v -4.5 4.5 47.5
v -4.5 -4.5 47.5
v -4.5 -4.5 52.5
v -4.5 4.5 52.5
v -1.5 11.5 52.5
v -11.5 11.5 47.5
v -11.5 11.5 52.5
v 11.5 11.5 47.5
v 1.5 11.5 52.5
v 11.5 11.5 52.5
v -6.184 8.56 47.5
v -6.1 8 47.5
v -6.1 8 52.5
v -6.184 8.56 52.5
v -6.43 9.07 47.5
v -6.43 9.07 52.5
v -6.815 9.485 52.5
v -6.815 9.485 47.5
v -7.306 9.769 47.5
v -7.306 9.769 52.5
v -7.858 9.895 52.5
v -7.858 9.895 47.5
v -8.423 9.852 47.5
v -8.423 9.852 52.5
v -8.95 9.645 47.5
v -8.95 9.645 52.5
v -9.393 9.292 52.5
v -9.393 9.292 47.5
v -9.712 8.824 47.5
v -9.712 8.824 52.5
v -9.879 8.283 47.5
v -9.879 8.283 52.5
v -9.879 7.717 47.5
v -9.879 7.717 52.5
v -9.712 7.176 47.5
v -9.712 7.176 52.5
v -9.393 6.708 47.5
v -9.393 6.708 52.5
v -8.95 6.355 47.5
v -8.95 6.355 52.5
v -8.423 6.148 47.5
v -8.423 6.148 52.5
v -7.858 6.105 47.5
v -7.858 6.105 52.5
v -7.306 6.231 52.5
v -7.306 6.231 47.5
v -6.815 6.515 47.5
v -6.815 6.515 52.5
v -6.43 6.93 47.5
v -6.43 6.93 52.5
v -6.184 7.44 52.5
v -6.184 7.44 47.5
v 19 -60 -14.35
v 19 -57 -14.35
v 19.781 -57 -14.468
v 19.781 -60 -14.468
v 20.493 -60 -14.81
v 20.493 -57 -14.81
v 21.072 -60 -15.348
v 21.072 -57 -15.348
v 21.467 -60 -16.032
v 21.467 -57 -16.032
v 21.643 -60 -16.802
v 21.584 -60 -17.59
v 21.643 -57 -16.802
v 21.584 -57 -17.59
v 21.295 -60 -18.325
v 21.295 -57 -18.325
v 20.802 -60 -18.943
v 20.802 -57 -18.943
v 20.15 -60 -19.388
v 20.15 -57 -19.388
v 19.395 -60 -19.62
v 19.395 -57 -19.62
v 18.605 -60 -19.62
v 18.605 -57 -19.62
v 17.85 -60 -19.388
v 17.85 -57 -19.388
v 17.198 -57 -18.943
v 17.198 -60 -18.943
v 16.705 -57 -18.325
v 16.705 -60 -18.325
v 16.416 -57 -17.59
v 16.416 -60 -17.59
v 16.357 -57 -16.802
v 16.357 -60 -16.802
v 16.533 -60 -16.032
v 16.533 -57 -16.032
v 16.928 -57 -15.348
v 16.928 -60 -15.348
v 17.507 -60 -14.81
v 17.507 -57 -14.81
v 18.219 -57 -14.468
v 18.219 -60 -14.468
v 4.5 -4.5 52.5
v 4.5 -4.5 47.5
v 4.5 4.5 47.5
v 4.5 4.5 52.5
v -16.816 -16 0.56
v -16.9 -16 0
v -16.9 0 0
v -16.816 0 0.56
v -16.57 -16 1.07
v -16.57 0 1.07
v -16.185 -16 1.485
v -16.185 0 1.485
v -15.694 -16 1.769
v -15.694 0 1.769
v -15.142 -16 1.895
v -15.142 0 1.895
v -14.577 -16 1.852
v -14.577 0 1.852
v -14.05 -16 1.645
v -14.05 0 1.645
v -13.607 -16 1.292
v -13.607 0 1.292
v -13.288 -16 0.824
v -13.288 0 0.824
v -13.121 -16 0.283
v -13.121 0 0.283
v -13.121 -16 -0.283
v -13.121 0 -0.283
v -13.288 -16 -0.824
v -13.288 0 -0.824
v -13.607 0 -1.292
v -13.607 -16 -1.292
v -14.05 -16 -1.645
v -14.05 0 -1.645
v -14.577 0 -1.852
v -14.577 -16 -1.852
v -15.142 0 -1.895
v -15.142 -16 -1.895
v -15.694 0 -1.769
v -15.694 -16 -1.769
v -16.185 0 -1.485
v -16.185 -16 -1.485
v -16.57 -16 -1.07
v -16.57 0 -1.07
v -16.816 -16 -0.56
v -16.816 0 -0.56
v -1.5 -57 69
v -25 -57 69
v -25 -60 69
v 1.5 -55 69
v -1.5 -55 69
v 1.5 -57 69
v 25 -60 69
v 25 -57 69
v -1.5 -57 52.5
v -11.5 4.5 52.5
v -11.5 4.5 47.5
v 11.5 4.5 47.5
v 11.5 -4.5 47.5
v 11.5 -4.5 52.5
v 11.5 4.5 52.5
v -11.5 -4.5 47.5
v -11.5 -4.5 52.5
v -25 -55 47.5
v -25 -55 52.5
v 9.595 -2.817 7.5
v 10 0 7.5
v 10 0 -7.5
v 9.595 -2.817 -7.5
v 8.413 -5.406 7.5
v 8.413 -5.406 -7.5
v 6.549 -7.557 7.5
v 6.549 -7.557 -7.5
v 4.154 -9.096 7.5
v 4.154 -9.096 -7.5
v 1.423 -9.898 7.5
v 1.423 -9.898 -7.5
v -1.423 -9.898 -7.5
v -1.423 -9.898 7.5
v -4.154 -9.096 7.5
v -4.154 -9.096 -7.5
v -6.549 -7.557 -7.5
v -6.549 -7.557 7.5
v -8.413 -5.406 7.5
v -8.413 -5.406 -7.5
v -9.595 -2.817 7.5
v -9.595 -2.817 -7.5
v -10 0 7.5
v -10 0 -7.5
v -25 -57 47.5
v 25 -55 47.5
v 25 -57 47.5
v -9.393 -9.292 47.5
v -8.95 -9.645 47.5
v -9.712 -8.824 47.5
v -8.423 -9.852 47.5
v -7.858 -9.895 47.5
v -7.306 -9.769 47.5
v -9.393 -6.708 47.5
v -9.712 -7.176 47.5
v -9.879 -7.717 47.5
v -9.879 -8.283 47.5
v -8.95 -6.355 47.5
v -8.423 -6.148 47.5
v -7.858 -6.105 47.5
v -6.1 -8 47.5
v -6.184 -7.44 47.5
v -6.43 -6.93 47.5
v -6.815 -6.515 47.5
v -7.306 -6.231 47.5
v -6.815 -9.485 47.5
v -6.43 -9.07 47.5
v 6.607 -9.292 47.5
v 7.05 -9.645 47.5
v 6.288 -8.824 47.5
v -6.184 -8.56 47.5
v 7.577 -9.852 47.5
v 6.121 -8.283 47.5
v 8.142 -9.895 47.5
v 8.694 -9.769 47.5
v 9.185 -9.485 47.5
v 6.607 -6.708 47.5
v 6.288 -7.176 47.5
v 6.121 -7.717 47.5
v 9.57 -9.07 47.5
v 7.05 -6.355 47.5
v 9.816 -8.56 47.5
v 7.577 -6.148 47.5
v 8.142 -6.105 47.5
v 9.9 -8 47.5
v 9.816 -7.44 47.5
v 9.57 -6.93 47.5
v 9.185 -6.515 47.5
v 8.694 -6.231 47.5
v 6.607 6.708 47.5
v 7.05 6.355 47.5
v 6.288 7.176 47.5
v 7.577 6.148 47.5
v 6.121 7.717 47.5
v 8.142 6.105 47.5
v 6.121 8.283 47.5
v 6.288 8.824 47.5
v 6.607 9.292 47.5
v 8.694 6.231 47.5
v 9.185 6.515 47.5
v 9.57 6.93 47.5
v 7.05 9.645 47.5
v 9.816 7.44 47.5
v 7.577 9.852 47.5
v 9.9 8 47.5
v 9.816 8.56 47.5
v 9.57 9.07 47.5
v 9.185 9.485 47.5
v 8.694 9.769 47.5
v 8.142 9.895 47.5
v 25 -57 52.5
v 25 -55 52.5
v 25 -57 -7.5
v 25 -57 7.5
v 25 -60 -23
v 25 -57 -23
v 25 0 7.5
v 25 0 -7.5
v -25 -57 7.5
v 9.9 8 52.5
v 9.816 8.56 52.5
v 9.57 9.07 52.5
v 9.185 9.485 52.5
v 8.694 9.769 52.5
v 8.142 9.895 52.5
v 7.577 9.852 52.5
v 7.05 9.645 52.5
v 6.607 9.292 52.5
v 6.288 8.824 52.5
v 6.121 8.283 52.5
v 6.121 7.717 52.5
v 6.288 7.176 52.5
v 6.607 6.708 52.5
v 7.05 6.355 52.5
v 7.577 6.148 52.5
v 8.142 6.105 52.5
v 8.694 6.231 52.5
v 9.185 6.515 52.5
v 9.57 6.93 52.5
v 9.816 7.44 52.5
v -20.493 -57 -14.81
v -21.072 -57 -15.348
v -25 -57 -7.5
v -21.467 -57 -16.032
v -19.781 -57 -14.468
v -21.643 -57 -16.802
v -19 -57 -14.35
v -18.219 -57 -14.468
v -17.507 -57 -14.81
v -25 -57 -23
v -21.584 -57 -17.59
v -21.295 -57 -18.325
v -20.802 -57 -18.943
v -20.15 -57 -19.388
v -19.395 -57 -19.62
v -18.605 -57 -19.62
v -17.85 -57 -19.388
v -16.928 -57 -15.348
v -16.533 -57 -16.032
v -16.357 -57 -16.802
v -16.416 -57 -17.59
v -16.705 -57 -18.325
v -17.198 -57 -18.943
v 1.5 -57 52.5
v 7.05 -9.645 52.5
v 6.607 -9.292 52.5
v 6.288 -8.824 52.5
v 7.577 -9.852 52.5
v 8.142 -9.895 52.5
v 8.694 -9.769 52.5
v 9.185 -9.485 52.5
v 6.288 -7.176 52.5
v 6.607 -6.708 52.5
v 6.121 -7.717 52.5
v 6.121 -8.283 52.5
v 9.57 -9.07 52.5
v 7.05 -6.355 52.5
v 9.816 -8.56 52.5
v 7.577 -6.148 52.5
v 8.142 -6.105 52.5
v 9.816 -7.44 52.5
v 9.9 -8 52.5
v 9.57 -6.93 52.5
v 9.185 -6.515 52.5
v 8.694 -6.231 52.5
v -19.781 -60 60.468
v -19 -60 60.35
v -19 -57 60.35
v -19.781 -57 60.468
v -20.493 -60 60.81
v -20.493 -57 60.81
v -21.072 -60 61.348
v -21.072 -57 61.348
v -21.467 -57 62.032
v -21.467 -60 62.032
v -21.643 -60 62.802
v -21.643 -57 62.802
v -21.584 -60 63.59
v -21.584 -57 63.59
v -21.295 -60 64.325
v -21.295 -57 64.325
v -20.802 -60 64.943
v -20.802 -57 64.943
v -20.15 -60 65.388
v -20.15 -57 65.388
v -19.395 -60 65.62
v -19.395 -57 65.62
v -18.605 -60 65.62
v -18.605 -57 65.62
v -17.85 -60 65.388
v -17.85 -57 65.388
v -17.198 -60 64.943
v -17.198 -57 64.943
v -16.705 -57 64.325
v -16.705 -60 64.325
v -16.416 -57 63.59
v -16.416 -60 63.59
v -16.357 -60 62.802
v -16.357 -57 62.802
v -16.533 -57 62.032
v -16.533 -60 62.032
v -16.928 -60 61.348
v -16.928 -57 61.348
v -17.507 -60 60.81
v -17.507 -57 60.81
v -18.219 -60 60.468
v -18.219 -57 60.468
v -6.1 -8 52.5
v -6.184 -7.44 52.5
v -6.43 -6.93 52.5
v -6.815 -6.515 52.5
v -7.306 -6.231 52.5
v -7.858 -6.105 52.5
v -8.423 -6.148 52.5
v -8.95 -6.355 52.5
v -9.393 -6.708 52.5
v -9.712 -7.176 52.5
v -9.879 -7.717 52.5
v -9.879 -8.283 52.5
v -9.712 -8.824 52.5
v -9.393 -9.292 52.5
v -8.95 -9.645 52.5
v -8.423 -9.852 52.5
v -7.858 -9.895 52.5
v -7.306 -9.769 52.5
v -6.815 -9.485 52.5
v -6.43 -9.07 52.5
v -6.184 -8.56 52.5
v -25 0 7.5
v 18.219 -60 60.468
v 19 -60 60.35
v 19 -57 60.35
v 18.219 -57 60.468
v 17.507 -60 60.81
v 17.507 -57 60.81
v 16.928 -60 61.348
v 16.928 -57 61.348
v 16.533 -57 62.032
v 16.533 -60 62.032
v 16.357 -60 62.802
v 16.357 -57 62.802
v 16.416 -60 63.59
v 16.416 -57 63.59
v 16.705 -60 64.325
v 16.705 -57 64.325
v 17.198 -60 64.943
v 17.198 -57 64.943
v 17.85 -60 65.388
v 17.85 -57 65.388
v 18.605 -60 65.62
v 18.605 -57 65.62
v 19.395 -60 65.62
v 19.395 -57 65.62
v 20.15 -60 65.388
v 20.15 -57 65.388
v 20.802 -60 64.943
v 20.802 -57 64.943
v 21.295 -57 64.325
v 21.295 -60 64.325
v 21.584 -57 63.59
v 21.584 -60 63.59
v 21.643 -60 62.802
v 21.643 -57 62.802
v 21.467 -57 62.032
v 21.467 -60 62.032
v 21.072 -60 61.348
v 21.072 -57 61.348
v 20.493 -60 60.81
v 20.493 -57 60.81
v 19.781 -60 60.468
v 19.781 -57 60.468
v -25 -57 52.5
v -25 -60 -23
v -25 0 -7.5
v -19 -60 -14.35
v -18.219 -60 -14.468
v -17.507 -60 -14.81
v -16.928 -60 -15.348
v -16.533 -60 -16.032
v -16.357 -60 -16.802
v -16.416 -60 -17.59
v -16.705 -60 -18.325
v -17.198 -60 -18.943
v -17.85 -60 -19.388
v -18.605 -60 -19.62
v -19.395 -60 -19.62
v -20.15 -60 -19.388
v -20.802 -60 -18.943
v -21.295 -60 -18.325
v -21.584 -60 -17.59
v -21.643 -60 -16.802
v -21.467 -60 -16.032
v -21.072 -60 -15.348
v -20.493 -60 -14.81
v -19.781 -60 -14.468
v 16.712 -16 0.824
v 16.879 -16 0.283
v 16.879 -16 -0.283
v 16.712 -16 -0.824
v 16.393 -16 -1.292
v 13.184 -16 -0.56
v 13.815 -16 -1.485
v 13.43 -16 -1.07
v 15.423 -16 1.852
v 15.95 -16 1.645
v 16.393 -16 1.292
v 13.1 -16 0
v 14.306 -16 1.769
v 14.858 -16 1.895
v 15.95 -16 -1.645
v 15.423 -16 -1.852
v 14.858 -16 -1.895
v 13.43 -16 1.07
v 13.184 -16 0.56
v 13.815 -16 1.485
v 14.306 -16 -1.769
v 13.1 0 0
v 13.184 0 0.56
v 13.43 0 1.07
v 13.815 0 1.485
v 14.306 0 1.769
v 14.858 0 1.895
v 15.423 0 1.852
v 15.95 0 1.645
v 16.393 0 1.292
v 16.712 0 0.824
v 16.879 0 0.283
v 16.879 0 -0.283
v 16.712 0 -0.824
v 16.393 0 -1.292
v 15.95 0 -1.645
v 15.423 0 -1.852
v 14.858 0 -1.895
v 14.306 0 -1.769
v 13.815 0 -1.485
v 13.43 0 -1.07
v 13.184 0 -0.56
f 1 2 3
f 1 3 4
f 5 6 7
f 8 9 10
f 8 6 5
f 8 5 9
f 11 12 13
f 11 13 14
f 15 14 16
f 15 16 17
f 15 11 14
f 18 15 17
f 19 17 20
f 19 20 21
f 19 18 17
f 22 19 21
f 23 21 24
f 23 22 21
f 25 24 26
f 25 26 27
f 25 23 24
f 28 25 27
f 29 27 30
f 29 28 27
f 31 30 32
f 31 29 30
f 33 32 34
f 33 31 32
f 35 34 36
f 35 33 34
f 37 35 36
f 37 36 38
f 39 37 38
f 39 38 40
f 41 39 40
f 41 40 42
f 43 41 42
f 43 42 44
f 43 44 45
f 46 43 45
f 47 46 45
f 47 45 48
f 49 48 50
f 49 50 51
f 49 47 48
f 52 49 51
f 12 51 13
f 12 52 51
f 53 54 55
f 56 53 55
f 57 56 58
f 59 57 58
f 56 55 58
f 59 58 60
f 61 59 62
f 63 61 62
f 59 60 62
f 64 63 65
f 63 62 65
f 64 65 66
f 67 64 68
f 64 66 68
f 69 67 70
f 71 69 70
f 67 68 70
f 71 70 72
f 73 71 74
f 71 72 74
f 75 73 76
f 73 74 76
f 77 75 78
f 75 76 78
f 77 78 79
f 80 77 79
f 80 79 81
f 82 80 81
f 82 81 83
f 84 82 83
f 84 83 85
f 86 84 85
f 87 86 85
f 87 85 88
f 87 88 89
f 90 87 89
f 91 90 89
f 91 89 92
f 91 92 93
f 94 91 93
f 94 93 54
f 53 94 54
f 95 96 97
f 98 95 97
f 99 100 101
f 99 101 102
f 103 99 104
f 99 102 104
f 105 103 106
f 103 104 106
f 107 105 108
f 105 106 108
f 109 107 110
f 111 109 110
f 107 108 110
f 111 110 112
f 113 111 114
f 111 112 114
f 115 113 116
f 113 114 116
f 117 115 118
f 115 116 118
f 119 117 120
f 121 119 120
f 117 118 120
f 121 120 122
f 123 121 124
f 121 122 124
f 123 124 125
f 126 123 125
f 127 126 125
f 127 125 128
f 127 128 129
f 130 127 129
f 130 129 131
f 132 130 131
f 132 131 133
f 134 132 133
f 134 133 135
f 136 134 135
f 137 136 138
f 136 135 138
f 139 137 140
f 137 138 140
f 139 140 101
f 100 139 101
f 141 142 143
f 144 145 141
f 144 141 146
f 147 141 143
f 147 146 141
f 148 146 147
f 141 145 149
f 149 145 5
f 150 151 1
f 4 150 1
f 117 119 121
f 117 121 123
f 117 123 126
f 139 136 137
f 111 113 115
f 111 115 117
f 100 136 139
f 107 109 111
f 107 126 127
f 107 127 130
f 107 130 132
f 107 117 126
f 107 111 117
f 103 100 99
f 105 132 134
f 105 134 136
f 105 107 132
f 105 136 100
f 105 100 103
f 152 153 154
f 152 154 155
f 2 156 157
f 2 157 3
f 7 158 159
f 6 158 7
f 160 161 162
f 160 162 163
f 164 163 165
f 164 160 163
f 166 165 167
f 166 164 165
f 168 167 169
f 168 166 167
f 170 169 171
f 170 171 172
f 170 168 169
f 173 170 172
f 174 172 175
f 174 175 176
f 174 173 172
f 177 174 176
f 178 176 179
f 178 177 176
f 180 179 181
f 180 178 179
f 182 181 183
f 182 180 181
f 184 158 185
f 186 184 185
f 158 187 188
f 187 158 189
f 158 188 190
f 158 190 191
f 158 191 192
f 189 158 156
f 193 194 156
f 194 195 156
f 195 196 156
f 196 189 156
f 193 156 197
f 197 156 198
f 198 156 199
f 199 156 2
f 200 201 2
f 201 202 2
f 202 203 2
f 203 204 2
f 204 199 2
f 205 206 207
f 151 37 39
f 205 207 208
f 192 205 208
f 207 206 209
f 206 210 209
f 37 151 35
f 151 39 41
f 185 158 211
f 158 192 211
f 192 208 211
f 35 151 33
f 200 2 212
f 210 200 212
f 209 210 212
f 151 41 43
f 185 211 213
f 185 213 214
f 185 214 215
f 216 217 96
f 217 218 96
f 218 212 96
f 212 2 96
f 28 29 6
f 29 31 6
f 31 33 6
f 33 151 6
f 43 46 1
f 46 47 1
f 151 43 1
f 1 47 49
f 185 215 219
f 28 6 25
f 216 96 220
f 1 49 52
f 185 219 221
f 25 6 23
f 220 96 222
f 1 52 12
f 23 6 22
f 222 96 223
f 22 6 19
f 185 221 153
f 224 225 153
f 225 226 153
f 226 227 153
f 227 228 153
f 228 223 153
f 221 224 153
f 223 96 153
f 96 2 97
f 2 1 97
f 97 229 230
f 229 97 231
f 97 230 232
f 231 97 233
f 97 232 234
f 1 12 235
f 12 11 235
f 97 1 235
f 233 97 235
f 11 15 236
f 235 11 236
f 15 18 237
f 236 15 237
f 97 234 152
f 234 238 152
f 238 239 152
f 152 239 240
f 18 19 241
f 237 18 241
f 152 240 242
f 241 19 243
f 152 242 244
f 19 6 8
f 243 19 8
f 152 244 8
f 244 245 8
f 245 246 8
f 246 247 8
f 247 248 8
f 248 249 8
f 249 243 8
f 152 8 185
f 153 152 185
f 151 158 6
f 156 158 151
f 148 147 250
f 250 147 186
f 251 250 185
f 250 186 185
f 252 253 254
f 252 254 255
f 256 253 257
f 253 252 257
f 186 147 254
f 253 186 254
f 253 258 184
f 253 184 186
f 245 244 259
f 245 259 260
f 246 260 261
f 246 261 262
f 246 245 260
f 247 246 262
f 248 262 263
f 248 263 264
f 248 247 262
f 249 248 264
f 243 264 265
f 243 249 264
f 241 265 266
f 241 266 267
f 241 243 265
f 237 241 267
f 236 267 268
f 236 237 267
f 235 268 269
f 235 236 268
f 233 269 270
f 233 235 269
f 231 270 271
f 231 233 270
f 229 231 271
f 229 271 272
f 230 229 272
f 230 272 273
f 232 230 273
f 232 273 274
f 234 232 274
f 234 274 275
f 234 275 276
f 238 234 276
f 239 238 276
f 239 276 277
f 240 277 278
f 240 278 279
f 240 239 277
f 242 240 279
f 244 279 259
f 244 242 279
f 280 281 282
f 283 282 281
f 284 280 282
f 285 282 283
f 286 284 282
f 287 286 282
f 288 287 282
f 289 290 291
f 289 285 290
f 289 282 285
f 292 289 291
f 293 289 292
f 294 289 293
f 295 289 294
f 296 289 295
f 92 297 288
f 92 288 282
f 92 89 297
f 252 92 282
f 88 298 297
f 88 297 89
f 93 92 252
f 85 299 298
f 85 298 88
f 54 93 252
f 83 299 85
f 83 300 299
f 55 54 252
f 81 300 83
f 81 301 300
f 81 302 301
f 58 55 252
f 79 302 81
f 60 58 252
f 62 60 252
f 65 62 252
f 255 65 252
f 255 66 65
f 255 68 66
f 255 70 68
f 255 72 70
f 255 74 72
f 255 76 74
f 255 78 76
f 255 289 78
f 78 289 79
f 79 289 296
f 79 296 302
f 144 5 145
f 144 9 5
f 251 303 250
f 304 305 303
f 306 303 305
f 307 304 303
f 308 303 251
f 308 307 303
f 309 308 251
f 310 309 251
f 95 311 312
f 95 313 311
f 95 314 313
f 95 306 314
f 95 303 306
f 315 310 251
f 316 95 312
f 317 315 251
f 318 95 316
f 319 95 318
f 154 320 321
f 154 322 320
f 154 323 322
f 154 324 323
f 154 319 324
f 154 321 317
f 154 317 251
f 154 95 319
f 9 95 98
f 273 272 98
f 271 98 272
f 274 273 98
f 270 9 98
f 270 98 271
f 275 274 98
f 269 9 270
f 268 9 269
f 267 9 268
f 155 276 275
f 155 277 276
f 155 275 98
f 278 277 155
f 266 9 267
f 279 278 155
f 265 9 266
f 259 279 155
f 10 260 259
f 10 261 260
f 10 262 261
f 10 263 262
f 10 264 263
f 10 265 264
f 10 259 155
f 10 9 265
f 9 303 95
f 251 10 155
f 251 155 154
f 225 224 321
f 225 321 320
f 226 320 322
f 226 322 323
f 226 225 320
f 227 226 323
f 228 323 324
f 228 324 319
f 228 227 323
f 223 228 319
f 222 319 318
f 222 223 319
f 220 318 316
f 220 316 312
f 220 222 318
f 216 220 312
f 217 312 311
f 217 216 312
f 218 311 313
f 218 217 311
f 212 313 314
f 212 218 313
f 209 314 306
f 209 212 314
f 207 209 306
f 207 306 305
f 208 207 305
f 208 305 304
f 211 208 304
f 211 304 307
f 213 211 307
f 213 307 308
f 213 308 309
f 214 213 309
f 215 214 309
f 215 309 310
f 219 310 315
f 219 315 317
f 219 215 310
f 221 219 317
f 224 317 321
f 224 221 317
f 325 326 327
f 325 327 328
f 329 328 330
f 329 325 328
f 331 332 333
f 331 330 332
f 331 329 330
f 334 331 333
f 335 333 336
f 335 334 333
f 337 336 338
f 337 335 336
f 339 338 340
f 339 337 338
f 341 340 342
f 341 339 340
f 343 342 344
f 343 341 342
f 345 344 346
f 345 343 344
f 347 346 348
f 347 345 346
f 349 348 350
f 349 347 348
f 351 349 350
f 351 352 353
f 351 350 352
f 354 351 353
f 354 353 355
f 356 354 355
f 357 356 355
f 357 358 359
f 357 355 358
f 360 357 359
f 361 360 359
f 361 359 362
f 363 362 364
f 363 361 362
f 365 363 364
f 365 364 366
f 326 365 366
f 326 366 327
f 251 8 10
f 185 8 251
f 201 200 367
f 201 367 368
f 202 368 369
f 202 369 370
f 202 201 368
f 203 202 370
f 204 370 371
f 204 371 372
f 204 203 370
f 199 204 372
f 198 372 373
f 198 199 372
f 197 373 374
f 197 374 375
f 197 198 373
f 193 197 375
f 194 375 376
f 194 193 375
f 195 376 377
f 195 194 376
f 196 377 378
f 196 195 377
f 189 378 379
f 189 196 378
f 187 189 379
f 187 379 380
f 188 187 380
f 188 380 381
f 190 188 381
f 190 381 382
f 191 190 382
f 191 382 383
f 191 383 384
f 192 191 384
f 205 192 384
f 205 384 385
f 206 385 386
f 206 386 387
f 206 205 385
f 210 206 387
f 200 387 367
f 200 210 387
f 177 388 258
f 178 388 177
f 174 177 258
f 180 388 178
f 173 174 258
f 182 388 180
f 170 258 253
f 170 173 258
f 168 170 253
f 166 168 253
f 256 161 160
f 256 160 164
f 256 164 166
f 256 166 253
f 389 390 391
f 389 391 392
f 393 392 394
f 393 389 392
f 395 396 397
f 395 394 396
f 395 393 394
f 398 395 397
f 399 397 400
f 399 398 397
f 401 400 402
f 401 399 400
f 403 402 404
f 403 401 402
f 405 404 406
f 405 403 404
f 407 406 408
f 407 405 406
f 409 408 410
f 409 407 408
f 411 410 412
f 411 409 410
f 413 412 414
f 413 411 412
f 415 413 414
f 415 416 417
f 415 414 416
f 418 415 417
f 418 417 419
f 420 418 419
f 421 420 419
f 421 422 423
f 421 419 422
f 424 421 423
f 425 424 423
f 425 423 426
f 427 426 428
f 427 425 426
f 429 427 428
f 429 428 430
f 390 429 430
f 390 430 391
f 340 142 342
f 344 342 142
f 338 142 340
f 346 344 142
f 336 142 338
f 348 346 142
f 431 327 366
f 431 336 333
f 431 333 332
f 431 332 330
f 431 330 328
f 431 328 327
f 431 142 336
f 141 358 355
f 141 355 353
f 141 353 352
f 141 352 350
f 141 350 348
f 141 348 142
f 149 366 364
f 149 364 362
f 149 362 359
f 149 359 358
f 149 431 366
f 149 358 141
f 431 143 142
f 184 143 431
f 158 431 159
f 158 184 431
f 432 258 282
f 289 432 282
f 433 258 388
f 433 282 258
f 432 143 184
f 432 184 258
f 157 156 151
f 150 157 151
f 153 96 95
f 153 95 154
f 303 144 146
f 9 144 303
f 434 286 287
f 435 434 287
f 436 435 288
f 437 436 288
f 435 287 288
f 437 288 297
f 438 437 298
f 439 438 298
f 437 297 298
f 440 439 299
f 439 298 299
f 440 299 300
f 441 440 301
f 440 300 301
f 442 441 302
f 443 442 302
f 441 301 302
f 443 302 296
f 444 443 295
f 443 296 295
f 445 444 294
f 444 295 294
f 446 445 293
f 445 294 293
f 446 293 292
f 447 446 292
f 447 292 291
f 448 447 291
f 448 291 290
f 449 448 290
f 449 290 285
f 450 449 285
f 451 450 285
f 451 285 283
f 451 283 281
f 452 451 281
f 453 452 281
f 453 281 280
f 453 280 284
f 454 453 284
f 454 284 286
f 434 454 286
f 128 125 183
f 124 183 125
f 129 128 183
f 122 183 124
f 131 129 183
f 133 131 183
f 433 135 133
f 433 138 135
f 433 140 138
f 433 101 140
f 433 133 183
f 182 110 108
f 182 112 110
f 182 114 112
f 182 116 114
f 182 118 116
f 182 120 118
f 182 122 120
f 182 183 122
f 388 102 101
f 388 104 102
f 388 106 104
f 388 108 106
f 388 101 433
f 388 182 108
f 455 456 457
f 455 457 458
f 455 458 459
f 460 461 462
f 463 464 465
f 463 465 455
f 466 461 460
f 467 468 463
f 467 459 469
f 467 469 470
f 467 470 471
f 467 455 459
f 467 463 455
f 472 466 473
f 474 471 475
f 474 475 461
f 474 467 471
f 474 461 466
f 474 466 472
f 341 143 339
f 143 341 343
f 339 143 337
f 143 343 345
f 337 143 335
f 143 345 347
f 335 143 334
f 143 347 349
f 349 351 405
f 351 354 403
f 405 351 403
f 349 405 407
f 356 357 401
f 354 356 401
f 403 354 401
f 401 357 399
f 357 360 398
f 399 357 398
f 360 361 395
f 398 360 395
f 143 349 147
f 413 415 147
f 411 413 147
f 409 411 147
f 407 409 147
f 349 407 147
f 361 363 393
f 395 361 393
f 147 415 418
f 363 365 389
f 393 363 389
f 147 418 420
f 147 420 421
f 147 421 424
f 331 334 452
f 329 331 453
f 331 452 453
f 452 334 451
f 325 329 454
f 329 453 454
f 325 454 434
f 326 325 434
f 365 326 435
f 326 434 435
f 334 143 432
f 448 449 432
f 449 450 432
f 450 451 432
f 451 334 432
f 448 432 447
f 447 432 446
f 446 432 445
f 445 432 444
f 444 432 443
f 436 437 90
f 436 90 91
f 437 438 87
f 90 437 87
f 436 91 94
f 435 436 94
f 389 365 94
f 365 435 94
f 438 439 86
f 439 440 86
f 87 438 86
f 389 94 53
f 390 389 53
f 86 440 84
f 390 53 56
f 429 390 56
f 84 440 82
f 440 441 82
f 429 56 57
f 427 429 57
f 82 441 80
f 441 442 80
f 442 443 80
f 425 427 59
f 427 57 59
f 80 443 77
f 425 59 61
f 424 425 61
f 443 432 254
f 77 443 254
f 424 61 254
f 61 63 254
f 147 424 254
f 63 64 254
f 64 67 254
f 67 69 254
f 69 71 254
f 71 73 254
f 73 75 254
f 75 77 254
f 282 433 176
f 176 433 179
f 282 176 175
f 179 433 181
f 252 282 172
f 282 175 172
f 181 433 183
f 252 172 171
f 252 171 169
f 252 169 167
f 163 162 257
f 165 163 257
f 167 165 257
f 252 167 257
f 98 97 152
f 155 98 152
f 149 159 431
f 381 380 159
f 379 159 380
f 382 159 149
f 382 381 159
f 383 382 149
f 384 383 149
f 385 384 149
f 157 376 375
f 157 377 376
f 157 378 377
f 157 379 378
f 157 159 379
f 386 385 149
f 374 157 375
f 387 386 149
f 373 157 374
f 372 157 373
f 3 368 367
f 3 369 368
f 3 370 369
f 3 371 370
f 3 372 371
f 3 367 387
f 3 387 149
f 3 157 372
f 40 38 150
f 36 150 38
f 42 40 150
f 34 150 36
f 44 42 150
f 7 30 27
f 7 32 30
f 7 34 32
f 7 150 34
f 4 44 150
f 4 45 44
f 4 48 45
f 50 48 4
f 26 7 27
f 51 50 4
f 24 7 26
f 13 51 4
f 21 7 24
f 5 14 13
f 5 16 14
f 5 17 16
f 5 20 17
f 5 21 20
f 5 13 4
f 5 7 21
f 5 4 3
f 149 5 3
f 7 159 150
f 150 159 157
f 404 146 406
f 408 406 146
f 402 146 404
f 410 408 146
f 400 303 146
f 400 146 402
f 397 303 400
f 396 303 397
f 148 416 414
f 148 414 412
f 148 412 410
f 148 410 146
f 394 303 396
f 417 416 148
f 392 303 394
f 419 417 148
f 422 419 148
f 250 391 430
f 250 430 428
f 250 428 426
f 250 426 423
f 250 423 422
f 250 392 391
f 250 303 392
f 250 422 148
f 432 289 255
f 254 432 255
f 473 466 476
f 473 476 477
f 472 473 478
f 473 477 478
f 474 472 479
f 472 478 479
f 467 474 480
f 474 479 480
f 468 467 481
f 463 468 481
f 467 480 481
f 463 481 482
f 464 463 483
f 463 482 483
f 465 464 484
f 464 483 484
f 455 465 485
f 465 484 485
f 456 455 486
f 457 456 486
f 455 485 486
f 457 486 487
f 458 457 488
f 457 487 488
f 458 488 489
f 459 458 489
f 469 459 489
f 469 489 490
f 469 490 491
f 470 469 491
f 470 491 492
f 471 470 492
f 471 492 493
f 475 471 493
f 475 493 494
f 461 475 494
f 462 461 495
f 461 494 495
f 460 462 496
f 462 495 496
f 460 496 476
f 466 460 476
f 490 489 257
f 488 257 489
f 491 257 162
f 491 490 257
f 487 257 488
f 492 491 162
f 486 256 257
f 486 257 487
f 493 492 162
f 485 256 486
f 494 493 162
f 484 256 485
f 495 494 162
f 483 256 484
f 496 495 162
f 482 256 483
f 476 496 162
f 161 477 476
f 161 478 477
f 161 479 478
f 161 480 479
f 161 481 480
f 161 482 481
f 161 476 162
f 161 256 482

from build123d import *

# Parameters (mm, degrees)
MOTOR_MOUNT_SOLID_DEPTH              = 7.5
ENCODER_DISTANCE_SKETCH_W            = 50
ENCODER_DISTANCE_SKETCH_H            = 55
ENCODER_DISTANCE_SOLID_DEPTH         = 5
ENCODER_MOUNT_SKETCH_R               = 1.9
ENCODER_MOUNT_SKETCH_W               = 7
ENCODER_MOUNT_SKETCH_H               = 9
ENCODER_MOUNT_SOLID_DEPTH            = 5
MOTOR_CLAMP_MOUNTING_HOLES_SKETCH_R  = 1.9
MOTOR_CLAMP_MOUNTING_HOLES_CUT_DEPTH = 16
GUSSET_PLATE_SKETCH_W                = 50
GUSSET_PLATE_SKETCH_H                = 5
GUSSET_PLATE_SOLID_DEPTH             = 16.5
GUSSET_SOLID_DEPTH                   = 1.5
MOUNTING_PLATE_SKETCH_W              = 50
MOUNTING_PLATE_SKETCH_H              = 92
MOUNTING_PLATE_SKETCH_R              = 2.65
MOUNTING_PLATE_SOLID_DEPTH           = 5
MOUNTING_HOLES_CUT_DEPTH             = 100.036609393
MOUNTING_HOLES_CUT_DEPTH_BACK        = 100.036609393
MOUNTING_HOLE_SKETCH_R               = 2.65
MOUNTING_PLATE_TRIM_SKETCH_W         = 50
MOUNTING_PLATE_TRIM_SKETCH_H         = 15.5
MOUNTING_PLATE_TRIM_SKETCH_H_2       = 40
MOUNTING_PLATE_TRIM_SKETCH_W_2       = 23.5
MOUNTING_PLATE_TRIM_SKETCH_H_3       = 16.5
MOUNTING_PLATE_TRIM_CUT_DEPTH        = 2


with BuildPart() as part:
    # Mouting Mount Sketch → Motor Mount Solid (new, symmetric)
    with BuildSketch(Plane.XY):
        with BuildLine():
            Line((-25, -55), (25, -55))
            Line((25, -55), (25, 0))
            Line((25, 0), (10, 0))
            ThreePointArc((10, 0), (0, -10), (-10, 0))
            Line((-10, 0), (-25, 0))
            Line((-25, 0), (-25, -55))
        make_face()
    extrude(amount=MOTOR_MOUNT_SOLID_DEPTH, both=True)

    # Encoder Distance Sketch → Encoder Distance Solid (add)
    with BuildSketch(Plane.XZ.offset(55)):
        with Locations((0, 20)):
            Rectangle(ENCODER_DISTANCE_SKETCH_W, ENCODER_DISTANCE_SKETCH_H)
    extrude(amount=ENCODER_DISTANCE_SOLID_DEPTH)

    # Encoder Mount Sketch → Encoder Mount Solid (add)
    with BuildSketch(Plane.XY.offset(47.5)):
        Polygon((-25, -60), (-25, -55), (-11.5, 11.5), (11.5, 11.5), (25, -55), (25, -60), align=None)
        with Locations((-8, 8)):
            Circle(ENCODER_MOUNT_SKETCH_R, mode=Mode.SUBTRACT)
        with Locations((8, 8)):
            Circle(ENCODER_MOUNT_SKETCH_R, mode=Mode.SUBTRACT)
        with Locations((-8, -8)):
            Circle(ENCODER_MOUNT_SKETCH_R, mode=Mode.SUBTRACT)
        with Locations((8, -8)):
            Circle(ENCODER_MOUNT_SKETCH_R, mode=Mode.SUBTRACT)
        with Locations((-8, 0)):
            Rectangle(ENCODER_MOUNT_SKETCH_W, ENCODER_MOUNT_SKETCH_H, mode=Mode.SUBTRACT)
        with Locations((8, 0)):
            Rectangle(ENCODER_MOUNT_SKETCH_W, ENCODER_MOUNT_SKETCH_H, mode=Mode.SUBTRACT)
    extrude(amount=ENCODER_MOUNT_SOLID_DEPTH)

    # Motor Clamp Mounting Holes Sketch → Motor Clamp Mounting Holes Cut (cut)
    with BuildSketch(Plane(origin=(0, 0, 0), x_dir=(1, 0, 0), z_dir=(0, 1, 0))):
        with Locations(Location((-15, 0, 0), (0, 0, 180))):
            Circle(MOTOR_CLAMP_MOUNTING_HOLES_SKETCH_R)
        with Locations(Location((15, 0, 0), (0, 0, 180))):
            Circle(MOTOR_CLAMP_MOUNTING_HOLES_SKETCH_R)
    extrude(amount=-MOTOR_CLAMP_MOUNTING_HOLES_CUT_DEPTH, mode=Mode.SUBTRACT)

    # Gusset Plate Sketch → Gusset Plate Solid (add)
    with BuildSketch(Plane.XY.offset(52.5)):
        with Locations((0, -57.5)):
            Rectangle(GUSSET_PLATE_SKETCH_W, GUSSET_PLATE_SKETCH_H)
    extrude(amount=GUSSET_PLATE_SOLID_DEPTH)

    # Gusset Sketch → Gusset Solid (add, symmetric)
    with BuildSketch(Plane(origin=(0, 0, 0), x_dir=(0, 0, -1), z_dir=(1, 0, 0))):
        Polygon((-52.5, 11.5), (-69, -55), (-52.5, -55), align=None)
    extrude(amount=GUSSET_SOLID_DEPTH, both=True)

    # Mounting Plate Sketch → Mounting Plate Solid (add)
    with BuildSketch(Plane(origin=(0, -55, 0), x_dir=(1, 0, 0), z_dir=(0, 1, 0))):
        with Locations((0, -23)):
            Rectangle(MOUNTING_PLATE_SKETCH_W, MOUNTING_PLATE_SKETCH_H)
        with Locations((-19, -63)):
            Circle(MOUNTING_PLATE_SKETCH_R, mode=Mode.SUBTRACT)
        with Locations((19, -63)):
            Circle(MOUNTING_PLATE_SKETCH_R, mode=Mode.SUBTRACT)
        with Locations(Location((-19, 17, 0), (0, 0, 270))):
            Circle(MOUNTING_PLATE_SKETCH_R, mode=Mode.SUBTRACT)
        with Locations(Location((19, 17, 0), (0, 0, 270))):
            Circle(MOUNTING_PLATE_SKETCH_R, mode=Mode.SUBTRACT)
    extrude(amount=-MOUNTING_PLATE_SOLID_DEPTH)

    # Mounting Hole Sketch → Mounting Holes Cut (cut, two sides: drawn at the far end of the back side and taken through both)
    with BuildSketch(Plane(origin=(0, -55, 0), x_dir=(1, 0, 0), z_dir=(0, 1, 0)).offset(-MOUNTING_HOLES_CUT_DEPTH_BACK)):
        with Locations(Location((-19, 17, 0), (0, 0, 270))):
            Circle(MOUNTING_HOLE_SKETCH_R)
        with Locations(Location((19, 17, 0), (0, 0, 270))):
            Circle(MOUNTING_HOLE_SKETCH_R)
        with Locations(Location((19, -63, 0), (0, 0, 90))):
            Circle(MOUNTING_HOLE_SKETCH_R)
        with Locations(Location((-19, -63, 0), (0, 0, 90))):
            Circle(MOUNTING_HOLE_SKETCH_R)
    extrude(amount=MOUNTING_HOLES_CUT_DEPTH + MOUNTING_HOLES_CUT_DEPTH_BACK, mode=Mode.SUBTRACT)

    # Mounting Plate Trim Sketch → Mounting Plate Trim Cut (cut)
    with BuildSketch(Plane(origin=(0, -55, 0), x_dir=(1, 0, 0), z_dir=(0, 1, 0))):
        with Locations((0, 15.25)):
            Rectangle(MOUNTING_PLATE_TRIM_SKETCH_W, MOUNTING_PLATE_TRIM_SKETCH_H)
        with Locations((0, -27.5)):
            Rectangle(MOUNTING_PLATE_TRIM_SKETCH_W, MOUNTING_PLATE_TRIM_SKETCH_H_2)
        with Locations((13.25, -60.75)):
            Rectangle(MOUNTING_PLATE_TRIM_SKETCH_W_2, MOUNTING_PLATE_TRIM_SKETCH_H_3)
        with Locations((-13.25, -60.75)):
            Rectangle(MOUNTING_PLATE_TRIM_SKETCH_W_2, MOUNTING_PLATE_TRIM_SKETCH_H_3)
    extrude(amount=-MOUNTING_PLATE_TRIM_CUT_DEPTH, mode=Mode.SUBTRACT)


solid = part.part
